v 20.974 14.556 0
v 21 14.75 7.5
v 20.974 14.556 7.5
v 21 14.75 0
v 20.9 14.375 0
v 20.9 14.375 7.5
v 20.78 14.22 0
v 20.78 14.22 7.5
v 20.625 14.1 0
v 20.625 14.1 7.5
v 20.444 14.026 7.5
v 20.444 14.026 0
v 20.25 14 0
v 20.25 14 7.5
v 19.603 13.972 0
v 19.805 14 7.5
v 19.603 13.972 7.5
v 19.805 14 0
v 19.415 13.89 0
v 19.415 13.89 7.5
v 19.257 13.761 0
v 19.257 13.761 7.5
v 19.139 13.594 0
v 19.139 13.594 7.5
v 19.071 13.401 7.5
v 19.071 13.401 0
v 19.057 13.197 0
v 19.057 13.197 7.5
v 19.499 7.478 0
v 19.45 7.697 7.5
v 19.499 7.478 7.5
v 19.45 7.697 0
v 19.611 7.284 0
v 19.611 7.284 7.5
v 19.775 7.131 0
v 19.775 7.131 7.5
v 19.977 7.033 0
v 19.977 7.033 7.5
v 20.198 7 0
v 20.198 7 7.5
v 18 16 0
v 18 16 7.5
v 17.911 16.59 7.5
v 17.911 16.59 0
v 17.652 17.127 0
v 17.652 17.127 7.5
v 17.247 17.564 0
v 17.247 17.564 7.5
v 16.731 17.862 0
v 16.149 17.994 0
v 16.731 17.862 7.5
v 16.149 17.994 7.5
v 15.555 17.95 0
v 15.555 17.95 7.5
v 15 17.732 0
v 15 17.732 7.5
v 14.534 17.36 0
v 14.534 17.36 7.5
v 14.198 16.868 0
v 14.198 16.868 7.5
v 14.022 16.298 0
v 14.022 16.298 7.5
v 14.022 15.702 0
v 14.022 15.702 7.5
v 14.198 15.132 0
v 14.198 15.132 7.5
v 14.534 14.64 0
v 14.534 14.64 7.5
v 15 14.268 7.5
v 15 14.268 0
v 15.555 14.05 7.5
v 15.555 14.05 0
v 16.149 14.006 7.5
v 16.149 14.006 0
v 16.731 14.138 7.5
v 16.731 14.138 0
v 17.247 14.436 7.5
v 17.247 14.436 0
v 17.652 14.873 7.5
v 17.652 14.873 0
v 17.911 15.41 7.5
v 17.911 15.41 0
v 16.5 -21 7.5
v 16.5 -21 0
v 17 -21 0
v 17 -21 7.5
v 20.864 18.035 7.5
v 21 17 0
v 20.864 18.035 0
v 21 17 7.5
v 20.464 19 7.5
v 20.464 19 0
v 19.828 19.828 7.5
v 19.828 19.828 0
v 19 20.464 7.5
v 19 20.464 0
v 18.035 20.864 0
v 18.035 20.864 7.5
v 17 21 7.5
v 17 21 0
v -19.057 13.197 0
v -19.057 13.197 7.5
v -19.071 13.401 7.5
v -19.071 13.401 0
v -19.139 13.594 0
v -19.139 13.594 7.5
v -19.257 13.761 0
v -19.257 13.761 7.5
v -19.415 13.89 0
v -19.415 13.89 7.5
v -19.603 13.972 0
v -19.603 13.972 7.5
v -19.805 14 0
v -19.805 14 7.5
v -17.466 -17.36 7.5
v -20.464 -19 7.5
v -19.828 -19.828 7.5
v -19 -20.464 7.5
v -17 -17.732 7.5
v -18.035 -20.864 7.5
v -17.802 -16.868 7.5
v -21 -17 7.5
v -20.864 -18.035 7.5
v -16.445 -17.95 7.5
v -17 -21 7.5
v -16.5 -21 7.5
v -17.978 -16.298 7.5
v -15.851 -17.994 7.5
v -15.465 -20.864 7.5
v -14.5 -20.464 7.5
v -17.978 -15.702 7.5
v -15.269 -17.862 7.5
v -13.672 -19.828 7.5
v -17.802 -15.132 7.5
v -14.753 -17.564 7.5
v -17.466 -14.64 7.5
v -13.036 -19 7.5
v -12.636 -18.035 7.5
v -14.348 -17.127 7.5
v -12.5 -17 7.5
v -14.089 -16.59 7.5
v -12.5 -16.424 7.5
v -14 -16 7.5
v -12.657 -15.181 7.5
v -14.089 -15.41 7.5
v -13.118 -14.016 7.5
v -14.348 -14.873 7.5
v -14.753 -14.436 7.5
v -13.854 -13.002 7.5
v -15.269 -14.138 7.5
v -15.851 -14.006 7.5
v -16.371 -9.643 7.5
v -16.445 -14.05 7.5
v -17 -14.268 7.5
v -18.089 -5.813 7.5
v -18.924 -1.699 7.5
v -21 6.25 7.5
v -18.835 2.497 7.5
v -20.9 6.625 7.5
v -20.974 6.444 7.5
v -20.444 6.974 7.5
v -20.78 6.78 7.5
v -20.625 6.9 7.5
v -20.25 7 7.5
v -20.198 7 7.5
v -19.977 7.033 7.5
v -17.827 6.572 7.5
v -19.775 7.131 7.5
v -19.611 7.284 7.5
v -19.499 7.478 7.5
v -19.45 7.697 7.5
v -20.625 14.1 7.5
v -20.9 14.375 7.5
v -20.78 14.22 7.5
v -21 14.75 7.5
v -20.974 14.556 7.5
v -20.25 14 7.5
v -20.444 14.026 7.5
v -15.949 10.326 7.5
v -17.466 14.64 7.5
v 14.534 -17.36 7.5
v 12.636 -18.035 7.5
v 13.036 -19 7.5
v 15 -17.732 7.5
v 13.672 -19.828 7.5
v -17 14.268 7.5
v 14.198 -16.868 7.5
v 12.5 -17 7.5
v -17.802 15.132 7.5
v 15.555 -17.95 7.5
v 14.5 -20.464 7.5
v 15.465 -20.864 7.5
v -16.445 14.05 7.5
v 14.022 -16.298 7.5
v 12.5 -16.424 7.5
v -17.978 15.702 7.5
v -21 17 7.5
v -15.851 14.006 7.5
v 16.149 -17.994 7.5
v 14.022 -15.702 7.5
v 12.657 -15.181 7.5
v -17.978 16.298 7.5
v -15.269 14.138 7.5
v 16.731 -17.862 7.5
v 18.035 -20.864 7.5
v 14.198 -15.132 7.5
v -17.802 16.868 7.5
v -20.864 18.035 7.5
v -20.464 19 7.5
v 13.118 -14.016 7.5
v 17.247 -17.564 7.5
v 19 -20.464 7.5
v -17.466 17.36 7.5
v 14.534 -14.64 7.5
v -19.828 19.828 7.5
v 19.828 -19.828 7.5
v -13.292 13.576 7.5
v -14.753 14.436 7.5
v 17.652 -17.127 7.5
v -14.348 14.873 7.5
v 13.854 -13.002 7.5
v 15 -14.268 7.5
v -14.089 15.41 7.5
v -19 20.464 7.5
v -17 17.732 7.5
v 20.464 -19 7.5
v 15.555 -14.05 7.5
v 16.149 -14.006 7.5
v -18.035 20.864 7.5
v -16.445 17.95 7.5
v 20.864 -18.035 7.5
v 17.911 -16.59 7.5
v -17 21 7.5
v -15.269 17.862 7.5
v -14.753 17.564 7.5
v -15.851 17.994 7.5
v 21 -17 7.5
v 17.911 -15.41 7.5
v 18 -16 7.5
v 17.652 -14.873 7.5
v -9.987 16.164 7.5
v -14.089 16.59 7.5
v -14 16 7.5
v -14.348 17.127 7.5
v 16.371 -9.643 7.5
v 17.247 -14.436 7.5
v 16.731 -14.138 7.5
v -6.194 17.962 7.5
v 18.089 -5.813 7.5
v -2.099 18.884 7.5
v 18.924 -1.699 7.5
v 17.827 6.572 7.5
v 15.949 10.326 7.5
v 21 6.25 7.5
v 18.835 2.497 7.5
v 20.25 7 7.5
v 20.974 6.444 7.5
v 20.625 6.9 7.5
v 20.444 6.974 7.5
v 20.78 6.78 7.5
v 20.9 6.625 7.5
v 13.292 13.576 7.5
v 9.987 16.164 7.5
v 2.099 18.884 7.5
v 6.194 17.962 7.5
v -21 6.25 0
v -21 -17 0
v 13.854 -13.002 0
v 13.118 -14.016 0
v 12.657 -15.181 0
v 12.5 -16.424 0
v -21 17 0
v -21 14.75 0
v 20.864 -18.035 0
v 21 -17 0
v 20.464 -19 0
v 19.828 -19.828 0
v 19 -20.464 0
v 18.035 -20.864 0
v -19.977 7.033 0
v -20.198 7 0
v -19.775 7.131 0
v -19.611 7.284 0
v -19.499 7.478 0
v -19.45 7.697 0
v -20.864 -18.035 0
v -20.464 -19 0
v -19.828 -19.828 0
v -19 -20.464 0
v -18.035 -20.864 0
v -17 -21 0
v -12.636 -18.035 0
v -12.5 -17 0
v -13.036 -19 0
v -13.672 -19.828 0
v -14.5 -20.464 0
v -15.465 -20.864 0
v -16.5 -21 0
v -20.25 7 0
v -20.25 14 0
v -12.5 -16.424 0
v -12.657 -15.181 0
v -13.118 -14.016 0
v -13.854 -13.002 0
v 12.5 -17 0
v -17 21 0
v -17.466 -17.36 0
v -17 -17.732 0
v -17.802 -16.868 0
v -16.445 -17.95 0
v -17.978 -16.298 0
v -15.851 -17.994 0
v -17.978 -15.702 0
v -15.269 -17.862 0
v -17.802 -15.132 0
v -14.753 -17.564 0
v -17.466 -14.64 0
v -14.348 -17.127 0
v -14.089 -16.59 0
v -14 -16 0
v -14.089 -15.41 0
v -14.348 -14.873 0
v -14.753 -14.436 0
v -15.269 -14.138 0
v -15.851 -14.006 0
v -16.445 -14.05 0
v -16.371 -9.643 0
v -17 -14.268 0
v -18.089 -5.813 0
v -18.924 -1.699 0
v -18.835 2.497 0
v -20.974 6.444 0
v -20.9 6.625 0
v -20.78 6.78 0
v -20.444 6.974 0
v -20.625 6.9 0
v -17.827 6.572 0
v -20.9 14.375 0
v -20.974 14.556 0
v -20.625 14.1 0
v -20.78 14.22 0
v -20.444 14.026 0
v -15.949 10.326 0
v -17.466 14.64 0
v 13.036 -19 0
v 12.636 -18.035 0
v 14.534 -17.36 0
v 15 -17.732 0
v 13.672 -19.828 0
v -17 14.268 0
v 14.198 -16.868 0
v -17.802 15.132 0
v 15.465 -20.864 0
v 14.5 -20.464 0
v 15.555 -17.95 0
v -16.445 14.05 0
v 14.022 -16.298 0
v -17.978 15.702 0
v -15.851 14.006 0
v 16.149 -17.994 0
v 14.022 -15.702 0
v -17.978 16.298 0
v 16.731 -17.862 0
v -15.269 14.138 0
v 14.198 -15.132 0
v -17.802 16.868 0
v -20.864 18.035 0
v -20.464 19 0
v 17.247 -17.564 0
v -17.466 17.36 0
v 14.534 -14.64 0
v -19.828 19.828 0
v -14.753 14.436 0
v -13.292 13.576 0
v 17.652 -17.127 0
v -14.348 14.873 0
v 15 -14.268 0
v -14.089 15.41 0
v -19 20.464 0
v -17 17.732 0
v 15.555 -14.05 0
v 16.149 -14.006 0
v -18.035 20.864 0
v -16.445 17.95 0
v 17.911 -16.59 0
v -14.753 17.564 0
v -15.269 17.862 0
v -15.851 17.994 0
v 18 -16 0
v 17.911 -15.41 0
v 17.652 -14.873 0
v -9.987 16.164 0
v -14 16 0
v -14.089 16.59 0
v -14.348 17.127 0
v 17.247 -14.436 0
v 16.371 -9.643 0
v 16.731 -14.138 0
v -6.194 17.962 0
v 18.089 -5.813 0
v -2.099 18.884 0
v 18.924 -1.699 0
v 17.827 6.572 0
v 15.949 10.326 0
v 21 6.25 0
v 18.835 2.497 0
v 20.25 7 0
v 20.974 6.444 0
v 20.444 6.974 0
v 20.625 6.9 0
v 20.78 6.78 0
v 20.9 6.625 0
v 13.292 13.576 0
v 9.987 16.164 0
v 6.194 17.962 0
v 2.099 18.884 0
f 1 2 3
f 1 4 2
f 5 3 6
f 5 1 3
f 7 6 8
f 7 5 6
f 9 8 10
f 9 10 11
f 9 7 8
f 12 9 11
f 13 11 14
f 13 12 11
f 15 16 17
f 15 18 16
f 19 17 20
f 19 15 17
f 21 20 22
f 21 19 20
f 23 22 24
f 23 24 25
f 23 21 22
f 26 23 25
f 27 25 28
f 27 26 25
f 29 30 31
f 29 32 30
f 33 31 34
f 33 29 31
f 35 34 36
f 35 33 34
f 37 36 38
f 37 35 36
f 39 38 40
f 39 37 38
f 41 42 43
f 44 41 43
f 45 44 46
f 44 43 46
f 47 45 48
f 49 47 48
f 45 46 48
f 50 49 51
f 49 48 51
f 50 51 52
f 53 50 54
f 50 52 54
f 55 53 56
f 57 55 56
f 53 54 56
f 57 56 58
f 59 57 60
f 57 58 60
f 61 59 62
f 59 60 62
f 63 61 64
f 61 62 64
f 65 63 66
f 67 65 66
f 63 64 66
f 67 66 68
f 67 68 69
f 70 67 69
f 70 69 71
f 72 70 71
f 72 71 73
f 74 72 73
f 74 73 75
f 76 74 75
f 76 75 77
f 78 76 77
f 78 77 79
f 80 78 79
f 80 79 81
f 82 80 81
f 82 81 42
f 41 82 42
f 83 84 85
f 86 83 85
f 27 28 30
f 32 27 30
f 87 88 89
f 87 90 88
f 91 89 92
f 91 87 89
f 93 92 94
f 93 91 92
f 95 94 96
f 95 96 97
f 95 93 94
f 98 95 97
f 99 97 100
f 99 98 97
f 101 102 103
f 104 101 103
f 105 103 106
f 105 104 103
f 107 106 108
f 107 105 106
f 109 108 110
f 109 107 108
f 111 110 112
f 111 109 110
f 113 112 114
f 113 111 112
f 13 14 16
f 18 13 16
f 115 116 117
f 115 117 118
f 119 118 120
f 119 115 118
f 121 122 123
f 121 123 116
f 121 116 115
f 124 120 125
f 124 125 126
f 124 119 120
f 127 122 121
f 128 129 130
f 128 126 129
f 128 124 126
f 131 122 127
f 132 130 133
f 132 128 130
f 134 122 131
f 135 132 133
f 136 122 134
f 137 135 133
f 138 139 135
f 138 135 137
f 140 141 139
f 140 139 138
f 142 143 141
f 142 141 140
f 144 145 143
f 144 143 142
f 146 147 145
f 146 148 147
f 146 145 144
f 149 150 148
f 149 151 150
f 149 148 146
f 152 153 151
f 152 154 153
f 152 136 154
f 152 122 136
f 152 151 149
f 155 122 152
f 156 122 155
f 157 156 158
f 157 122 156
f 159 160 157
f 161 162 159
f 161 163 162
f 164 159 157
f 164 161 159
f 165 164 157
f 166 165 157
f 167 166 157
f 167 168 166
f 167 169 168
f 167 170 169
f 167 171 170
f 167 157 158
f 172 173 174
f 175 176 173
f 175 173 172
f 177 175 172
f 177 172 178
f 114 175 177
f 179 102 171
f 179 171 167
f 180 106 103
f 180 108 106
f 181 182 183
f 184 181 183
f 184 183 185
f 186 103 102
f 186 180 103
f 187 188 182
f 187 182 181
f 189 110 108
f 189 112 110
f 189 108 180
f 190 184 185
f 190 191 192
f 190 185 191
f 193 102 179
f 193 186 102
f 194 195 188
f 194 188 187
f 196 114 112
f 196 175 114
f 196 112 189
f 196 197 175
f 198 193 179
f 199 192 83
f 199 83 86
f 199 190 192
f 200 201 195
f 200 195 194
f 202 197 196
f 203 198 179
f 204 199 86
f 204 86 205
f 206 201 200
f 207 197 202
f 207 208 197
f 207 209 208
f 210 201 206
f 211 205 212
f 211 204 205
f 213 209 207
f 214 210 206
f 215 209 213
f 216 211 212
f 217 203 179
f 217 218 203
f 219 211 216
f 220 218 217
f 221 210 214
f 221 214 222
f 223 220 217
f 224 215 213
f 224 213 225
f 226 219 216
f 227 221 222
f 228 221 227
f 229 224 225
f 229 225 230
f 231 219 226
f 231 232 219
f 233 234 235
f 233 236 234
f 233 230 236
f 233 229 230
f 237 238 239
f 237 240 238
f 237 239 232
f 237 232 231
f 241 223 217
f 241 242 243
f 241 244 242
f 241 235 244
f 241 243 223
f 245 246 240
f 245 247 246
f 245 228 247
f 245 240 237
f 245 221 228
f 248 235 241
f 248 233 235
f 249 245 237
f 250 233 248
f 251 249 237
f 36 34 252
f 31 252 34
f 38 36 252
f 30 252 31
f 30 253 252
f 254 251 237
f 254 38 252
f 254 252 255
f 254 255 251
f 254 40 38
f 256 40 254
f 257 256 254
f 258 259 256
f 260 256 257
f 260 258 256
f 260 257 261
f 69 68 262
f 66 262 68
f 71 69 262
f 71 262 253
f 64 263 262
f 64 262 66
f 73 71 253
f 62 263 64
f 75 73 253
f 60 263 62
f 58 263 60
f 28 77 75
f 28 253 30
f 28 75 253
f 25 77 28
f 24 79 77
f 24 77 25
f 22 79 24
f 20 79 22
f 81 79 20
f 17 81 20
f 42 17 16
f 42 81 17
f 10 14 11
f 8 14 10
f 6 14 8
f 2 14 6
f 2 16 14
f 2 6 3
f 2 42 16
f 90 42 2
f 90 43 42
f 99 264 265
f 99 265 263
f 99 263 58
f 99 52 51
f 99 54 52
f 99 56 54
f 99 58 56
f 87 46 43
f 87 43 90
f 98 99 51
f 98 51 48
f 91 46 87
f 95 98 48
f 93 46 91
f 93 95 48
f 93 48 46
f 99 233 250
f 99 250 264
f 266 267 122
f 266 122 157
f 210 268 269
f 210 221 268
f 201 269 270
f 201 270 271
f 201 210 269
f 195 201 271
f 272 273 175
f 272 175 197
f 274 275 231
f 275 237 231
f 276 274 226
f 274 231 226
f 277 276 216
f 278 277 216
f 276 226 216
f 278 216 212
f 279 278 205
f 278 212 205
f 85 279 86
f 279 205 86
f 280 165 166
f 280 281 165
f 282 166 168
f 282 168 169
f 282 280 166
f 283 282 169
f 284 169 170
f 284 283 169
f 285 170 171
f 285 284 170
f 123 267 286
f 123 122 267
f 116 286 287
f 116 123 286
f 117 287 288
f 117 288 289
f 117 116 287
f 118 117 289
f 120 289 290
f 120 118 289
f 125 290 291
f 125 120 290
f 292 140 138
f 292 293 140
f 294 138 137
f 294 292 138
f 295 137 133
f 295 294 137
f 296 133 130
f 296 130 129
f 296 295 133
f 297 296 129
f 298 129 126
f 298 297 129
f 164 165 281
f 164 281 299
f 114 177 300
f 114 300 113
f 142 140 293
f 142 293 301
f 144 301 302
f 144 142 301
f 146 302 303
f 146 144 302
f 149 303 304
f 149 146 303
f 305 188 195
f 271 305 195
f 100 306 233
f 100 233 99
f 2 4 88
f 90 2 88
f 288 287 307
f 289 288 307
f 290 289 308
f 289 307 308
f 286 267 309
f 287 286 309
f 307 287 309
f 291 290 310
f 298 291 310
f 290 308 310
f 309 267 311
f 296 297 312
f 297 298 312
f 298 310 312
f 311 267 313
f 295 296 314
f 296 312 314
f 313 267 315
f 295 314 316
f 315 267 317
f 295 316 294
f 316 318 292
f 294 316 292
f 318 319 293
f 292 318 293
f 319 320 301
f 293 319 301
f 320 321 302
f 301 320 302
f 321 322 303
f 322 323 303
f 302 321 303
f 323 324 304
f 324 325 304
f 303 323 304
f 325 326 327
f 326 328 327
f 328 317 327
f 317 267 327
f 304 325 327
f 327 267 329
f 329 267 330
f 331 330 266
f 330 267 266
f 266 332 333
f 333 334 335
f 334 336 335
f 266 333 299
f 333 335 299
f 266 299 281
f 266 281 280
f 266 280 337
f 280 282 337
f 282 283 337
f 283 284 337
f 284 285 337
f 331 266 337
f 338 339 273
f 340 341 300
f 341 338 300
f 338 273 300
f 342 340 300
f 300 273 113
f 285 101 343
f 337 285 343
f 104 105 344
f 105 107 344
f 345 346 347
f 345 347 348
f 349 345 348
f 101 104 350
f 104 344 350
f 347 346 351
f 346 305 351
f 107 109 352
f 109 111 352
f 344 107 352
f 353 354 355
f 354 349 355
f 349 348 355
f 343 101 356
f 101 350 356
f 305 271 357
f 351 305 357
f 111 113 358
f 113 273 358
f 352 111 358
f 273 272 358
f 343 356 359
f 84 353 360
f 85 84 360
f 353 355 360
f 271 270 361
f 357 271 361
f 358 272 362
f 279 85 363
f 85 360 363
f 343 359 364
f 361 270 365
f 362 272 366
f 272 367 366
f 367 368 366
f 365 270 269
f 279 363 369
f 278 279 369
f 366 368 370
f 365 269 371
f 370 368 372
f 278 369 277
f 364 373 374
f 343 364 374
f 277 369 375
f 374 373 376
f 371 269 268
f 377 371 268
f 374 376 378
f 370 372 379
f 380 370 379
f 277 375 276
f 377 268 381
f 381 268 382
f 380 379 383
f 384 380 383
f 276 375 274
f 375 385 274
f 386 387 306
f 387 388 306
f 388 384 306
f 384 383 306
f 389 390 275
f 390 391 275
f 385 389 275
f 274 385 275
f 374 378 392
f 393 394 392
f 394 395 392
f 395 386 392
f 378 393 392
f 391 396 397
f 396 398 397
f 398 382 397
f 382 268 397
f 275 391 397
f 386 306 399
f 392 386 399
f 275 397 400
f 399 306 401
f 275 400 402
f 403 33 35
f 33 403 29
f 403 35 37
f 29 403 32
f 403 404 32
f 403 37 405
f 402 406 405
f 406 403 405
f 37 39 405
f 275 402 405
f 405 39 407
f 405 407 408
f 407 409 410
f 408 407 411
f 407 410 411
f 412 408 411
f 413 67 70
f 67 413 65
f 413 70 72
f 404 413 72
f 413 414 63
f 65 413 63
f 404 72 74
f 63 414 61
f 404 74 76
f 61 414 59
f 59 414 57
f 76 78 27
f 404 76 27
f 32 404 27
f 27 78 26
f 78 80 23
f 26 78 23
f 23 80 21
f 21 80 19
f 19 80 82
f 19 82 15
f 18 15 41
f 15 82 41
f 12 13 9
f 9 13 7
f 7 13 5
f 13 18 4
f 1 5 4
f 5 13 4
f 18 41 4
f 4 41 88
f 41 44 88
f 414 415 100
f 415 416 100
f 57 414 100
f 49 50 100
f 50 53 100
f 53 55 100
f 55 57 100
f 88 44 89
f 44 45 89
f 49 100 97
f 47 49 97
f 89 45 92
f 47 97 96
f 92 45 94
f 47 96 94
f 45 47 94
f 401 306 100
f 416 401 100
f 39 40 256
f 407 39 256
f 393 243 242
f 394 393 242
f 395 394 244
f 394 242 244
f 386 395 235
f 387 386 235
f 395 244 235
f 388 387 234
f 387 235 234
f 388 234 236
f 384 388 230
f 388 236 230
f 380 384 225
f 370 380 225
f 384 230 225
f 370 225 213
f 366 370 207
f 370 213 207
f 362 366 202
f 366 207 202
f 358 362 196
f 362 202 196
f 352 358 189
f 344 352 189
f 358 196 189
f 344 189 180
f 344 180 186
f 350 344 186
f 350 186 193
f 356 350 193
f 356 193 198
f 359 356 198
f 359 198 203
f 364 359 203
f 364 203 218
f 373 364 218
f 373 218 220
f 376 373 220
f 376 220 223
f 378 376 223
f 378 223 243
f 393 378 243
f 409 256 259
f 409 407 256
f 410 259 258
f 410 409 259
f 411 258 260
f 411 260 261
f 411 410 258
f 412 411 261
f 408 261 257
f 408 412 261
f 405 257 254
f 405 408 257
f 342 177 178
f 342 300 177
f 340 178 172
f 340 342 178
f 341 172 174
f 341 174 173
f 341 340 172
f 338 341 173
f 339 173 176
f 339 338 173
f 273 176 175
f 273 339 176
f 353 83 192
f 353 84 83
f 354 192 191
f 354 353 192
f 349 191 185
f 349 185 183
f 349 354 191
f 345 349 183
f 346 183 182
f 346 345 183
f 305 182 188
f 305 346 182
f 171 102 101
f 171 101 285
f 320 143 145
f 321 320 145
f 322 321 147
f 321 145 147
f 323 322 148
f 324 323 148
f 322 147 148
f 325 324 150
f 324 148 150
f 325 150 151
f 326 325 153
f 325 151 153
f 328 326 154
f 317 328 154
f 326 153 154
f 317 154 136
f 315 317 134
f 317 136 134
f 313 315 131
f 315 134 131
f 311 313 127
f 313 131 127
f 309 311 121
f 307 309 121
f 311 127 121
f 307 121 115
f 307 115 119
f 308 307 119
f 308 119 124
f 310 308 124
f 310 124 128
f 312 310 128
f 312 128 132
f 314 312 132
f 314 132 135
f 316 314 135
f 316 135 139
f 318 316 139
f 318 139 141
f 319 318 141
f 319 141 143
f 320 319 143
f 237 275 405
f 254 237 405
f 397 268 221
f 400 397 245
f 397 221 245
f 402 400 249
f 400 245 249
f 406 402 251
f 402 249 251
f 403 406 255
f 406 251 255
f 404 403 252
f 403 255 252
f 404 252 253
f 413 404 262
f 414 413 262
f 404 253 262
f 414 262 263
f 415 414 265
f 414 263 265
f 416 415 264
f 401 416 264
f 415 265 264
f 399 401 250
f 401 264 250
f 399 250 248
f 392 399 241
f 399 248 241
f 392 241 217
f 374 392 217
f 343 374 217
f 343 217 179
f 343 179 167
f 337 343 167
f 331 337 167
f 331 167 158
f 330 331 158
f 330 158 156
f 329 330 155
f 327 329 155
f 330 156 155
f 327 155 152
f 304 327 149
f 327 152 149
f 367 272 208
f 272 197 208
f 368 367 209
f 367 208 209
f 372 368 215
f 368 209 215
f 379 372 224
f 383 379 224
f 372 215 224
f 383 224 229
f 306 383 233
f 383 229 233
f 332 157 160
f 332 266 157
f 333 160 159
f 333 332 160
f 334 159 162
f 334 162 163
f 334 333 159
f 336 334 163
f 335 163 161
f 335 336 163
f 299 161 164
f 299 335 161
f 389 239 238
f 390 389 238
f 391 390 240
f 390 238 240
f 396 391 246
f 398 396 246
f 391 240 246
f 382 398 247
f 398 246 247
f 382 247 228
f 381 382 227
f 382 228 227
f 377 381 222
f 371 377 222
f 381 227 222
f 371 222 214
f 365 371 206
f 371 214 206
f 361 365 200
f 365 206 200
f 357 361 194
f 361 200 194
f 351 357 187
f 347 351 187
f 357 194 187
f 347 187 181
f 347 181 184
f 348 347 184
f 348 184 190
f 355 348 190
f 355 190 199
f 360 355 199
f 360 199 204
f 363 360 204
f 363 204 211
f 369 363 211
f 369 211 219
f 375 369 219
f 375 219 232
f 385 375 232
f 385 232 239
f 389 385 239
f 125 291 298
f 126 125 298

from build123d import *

# Parameters (mm, degrees)
CROQUIS1_W              = 42
CROQUIS1_H              = 42
SALIENTE_EXTRUIR1_DEPTH = 7.5
CROQUIS2_R              = 19
CORTAR_EXTRUIR1_DEPTH   = 8.5
CROQUIS3_R              = 2
CORTAR_EXTRUIR2_DEPTH   = 8.5
CROQUIS4_W              = 25
CROQUIS4_H              = 33.5
CORTAR_EXTRUIR3_DEPTH   = 8.5
REDONDEO1_R             = 4
REDONDEO2_R             = 5
CORTAR_EXTRUIR4_DEPTH   = 8.5
REDONDEO3_R             = 0.75


with BuildPart() as part:
    # Croquis1 → Saliente-Extruir1 (new body)
    with BuildSketch(Plane.XY):
        Rectangle(CROQUIS1_W, CROQUIS1_H)
    extrude(amount=SALIENTE_EXTRUIR1_DEPTH)

    # Croquis2 → Cortar-Extruir1 (cut, through all)
    with BuildSketch(Plane.XY.offset(7.5)):
        Circle(CROQUIS2_R)
    extrude(amount=-CORTAR_EXTRUIR1_DEPTH, mode=Mode.SUBTRACT)

    # Croquis3 → Cortar-Extruir2 (cut, through all)
    with BuildSketch(Plane.XY.offset(7.5)):
        with Locations((-16, 16)):
            Circle(CROQUIS3_R)
        with Locations((16, 16)):
            Circle(CROQUIS3_R)
        with Locations((16, -16)):
            Circle(CROQUIS3_R)
        with Locations((-16, -16)):
            Circle(CROQUIS3_R)
    extrude(amount=-CORTAR_EXTRUIR2_DEPTH, mode=Mode.SUBTRACT)

    # Croquis4 → Cortar-Extruir3 (cut, through all)
    with BuildSketch(Plane.XY.offset(7.5)):
        with Locations((0, -4.25)):
            Rectangle(CROQUIS4_W, CROQUIS4_H)
    extrude(amount=-CORTAR_EXTRUIR3_DEPTH, mode=Mode.SUBTRACT)

    # Redondeo1
    redondeo1_edges = [part.edges().sort_by_distance(p)[0] for p in [
        (-12.5, -21, 3.75),
        (12.5, -21, 3.75),
        (-21, 21, 3.75),
        (21, 21, 3.75),
        (21, -21, 3.75),
        (-21, -21, 3.75),
    ]]
    fillet(redondeo1_edges, radius=REDONDEO1_R)

    # Redondeo2
    redondeo2_edges = [part.edges().sort_by_distance(p)[0] for p in [
        (12.5, -14.309088021, 3.75),
        (-12.5, -14.309088021, 3.75),
    ]]
    fillet(redondeo2_edges, radius=REDONDEO2_R)

    # Croquis5 → Cortar-Extruir4 (cut, through all)
    with BuildSketch(Plane.XY.offset(7.5)):
        Polygon((-21, 7), (-21, 14), (-19, 14), (-19.5, 7), align=None)
        Polygon((21, 14), (19, 14), (19.5, 7), (21, 7), align=None)
    extrude(amount=-CORTAR_EXTRUIR4_DEPTH, mode=Mode.SUBTRACT)

    # Redondeo3
    redondeo3_edges = [part.edges().sort_by_distance(p)[0] for p in [
        (-19.5, 7, 3.75),
        (-21, 7, 3.75),
        (-21, 14, 3.75),
        (-19, 14, 3.75),
        (21, 14, 3.75),
        (21, 7, 3.75),
        (19.5, 7, 3.75),
        (19, 14, 3.75),
    ]]
    fillet(redondeo3_edges, radius=REDONDEO3_R)


solid = part.part
